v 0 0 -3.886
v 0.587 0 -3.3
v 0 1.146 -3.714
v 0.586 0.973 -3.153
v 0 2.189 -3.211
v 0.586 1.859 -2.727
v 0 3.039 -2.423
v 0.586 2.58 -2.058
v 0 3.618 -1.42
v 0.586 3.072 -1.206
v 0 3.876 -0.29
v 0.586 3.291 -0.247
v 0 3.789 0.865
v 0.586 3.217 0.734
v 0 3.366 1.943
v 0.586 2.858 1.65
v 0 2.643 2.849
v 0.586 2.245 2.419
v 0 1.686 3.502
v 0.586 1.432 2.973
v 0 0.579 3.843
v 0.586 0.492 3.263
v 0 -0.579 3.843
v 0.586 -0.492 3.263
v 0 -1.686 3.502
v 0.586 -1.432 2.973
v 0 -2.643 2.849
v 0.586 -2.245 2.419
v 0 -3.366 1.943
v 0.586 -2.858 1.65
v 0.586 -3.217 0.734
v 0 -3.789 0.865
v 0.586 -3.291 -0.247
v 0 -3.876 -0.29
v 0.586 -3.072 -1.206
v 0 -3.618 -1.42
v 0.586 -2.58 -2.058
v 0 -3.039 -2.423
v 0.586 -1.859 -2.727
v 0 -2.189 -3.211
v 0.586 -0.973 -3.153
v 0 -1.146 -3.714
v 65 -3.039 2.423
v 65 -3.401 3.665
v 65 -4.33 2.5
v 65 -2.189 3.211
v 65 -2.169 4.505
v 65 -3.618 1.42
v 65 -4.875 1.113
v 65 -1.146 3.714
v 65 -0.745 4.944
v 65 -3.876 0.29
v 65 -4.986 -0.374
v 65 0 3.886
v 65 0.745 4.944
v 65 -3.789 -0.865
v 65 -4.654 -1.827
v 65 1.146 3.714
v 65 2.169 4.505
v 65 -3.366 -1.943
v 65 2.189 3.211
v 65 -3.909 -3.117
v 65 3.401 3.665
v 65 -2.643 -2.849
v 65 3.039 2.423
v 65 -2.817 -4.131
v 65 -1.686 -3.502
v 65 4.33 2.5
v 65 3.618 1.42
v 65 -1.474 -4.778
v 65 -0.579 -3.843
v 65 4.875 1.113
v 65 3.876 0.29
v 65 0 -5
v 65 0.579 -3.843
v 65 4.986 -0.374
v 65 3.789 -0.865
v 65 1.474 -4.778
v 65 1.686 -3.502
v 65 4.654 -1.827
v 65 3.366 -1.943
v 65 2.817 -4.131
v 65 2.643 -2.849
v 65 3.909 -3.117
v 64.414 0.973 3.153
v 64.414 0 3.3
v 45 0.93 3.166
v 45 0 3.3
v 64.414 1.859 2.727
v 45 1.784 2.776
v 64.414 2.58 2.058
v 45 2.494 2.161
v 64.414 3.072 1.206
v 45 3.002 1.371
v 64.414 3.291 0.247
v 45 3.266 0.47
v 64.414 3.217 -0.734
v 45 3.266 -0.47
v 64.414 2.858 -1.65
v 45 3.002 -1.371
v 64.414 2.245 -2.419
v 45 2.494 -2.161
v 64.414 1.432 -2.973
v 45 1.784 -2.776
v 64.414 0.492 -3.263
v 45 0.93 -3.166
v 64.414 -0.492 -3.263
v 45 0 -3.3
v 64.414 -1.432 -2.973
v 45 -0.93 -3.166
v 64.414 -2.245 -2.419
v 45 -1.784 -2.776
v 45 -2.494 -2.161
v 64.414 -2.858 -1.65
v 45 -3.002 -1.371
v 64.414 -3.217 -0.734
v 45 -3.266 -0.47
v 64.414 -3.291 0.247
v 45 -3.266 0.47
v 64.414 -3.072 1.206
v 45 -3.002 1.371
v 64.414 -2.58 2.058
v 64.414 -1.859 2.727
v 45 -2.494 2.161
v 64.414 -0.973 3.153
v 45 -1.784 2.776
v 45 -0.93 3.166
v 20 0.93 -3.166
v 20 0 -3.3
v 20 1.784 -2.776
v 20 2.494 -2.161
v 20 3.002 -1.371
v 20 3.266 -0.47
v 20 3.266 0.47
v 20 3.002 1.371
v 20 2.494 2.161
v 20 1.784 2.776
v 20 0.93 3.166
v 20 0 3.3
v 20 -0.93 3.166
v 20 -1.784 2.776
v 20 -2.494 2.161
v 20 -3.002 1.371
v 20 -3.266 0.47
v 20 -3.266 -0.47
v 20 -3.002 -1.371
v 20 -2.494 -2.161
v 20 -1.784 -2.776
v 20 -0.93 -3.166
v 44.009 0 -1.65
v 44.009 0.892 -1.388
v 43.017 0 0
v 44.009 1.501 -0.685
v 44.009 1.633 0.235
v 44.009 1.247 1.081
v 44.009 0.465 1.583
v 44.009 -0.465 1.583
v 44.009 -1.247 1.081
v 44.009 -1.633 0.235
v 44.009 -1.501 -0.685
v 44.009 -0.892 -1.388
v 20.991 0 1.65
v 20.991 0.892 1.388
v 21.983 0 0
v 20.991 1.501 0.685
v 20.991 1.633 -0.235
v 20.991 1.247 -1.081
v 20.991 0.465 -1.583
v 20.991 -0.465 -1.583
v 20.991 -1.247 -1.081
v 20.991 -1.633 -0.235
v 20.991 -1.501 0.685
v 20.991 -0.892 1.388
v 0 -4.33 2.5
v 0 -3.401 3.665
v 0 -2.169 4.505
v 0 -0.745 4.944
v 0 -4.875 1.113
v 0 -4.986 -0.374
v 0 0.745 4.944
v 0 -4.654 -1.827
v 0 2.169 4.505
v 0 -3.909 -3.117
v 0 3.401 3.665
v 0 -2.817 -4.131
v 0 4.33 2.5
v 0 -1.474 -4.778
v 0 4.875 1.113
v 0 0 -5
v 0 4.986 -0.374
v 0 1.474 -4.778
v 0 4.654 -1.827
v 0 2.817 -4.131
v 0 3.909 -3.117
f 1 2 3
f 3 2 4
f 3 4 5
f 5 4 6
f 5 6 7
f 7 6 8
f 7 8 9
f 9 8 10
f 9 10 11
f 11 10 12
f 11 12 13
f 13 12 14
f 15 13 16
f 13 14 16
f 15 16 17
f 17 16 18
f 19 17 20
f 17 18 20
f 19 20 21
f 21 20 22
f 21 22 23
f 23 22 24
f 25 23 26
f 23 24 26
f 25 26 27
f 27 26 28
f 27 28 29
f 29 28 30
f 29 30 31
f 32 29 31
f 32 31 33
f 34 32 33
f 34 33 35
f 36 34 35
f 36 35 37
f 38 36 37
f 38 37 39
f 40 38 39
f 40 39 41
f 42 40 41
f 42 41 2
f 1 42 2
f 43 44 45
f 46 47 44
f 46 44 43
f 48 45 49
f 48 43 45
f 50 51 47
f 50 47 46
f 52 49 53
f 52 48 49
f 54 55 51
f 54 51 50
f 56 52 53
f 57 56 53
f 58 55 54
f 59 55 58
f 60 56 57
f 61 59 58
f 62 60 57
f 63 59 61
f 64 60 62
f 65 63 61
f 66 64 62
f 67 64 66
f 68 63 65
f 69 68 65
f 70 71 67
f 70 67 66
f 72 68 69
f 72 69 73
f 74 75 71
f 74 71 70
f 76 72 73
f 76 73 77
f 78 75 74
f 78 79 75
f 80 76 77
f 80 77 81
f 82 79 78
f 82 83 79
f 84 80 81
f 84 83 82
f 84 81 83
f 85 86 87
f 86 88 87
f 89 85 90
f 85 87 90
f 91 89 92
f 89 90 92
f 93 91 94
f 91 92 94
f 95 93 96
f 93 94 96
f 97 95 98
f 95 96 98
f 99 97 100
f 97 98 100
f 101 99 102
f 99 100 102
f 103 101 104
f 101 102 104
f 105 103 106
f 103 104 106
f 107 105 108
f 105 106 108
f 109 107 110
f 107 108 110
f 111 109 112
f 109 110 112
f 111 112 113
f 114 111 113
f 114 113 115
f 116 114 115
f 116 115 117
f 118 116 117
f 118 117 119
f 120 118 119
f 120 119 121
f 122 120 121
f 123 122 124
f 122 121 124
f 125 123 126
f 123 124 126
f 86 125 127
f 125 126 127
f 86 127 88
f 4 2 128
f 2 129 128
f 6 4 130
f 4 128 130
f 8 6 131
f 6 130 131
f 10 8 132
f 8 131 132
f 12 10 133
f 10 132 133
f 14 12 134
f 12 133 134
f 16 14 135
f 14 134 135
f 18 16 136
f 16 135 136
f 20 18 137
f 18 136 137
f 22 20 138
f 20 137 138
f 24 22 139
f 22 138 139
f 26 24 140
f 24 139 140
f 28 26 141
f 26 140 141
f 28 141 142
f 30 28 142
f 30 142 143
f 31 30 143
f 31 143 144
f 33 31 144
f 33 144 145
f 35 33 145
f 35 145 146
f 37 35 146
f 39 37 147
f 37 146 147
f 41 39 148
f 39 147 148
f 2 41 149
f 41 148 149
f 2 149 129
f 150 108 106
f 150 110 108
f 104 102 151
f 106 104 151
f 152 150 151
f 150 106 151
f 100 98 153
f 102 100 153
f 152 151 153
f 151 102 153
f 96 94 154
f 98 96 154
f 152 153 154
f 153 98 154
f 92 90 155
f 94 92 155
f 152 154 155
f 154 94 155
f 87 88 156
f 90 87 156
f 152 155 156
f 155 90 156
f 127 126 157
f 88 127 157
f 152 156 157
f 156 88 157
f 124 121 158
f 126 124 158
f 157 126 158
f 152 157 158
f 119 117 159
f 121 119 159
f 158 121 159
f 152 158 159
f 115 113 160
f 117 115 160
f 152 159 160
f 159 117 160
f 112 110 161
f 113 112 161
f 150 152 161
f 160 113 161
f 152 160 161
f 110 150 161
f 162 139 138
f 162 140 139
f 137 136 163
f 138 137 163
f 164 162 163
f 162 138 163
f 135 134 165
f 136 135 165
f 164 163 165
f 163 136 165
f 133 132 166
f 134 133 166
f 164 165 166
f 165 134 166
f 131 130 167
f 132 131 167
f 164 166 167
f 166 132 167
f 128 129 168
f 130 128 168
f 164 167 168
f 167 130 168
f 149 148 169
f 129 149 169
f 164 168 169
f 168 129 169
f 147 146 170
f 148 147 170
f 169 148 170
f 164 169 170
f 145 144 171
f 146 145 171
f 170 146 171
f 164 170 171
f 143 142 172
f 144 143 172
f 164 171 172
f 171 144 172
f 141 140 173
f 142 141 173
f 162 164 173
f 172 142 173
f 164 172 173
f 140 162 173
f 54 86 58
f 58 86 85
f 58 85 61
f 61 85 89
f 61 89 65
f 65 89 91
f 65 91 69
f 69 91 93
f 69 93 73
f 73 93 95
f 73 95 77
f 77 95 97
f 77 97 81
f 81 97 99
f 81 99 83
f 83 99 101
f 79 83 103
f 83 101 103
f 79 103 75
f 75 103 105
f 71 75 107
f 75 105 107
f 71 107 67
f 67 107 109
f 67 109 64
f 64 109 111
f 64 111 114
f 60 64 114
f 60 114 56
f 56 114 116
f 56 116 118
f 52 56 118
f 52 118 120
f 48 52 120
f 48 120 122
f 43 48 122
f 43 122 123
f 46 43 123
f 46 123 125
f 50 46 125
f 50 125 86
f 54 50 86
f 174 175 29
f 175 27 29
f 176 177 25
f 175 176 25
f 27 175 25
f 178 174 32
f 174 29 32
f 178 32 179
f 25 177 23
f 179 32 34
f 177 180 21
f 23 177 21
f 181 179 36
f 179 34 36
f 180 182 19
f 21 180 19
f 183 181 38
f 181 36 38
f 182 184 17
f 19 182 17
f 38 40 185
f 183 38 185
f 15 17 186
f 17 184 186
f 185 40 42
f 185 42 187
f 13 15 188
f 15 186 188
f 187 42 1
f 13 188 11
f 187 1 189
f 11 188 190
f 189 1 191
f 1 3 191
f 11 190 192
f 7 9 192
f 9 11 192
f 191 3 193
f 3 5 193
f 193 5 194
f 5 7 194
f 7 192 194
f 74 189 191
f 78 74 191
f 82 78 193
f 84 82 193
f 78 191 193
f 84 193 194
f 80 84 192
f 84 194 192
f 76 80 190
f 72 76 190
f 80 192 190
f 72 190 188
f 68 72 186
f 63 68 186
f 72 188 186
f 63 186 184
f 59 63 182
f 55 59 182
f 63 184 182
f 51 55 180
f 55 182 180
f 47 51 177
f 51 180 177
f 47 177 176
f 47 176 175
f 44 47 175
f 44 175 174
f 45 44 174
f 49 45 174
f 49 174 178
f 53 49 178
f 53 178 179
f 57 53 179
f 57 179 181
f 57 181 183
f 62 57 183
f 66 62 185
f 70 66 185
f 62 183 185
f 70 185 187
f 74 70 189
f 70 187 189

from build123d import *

# Parameters (mm, degrees)
SKETCH_1_R                      = 5
EXTRUDE_2_DEPTH                 = 65
HOLE_WIZARD_G1_16_1_D           = 6.6
HOLE_WIZARD_G1_16_1_DEPTH       = 20
HOLE_WIZARD_G1_16_1_CSINK_D     = 7.773
HOLE_WIZARD_G1_16_1_CSINK_ANGLE = 90
HOLE_WIZARD_G1_16_1_TIP         = 1.982840043
HOLE_WIZARD_G1_16_2_D           = 6.6
HOLE_WIZARD_G1_16_2_DEPTH       = 20
HOLE_WIZARD_G1_16_2_CSINK_D     = 7.773
HOLE_WIZARD_G1_16_2_CSINK_ANGLE = 90
HOLE_WIZARD_G1_16_2_TIP         = 1.982840043


with BuildPart() as part:
    # 草图1 → 凸台-拉伸2 (new body)
    with BuildSketch(Plane(origin=(0, 0, 0), x_dir=(0, 0, -1), z_dir=(1, 0, 0))):
        Circle(SKETCH_1_R)
    extrude(amount=EXTRUDE_2_DEPTH)

    # G1/16 螺纹孔1
    with Locations(Plane.ZY):
        with Locations((0, 0)):
            CounterSinkHole(HOLE_WIZARD_G1_16_1_D / 2, HOLE_WIZARD_G1_16_1_CSINK_D / 2, depth=HOLE_WIZARD_G1_16_1_DEPTH, counter_sink_angle=HOLE_WIZARD_G1_16_1_CSINK_ANGLE)
            with Locations((0, 0, -(HOLE_WIZARD_G1_16_1_DEPTH + HOLE_WIZARD_G1_16_1_TIP / 2))):  # 118° drill point
                Cone(0, HOLE_WIZARD_G1_16_1_D / 2, HOLE_WIZARD_G1_16_1_TIP, mode=Mode.SUBTRACT)

    # G1/16 螺纹孔2
    with Locations(Plane(origin=(65, 0, 0), x_dir=(0, 0, -1), z_dir=(1, 0, 0))):
        with Locations((0, 0)):
            CounterSinkHole(HOLE_WIZARD_G1_16_2_D / 2, HOLE_WIZARD_G1_16_2_CSINK_D / 2, depth=HOLE_WIZARD_G1_16_2_DEPTH, counter_sink_angle=HOLE_WIZARD_G1_16_2_CSINK_ANGLE)
            with Locations((0, 0, -(HOLE_WIZARD_G1_16_2_DEPTH + HOLE_WIZARD_G1_16_2_TIP / 2))):  # 118° drill point
                Cone(0, HOLE_WIZARD_G1_16_2_D / 2, HOLE_WIZARD_G1_16_2_TIP, mode=Mode.SUBTRACT)


solid = part.part
